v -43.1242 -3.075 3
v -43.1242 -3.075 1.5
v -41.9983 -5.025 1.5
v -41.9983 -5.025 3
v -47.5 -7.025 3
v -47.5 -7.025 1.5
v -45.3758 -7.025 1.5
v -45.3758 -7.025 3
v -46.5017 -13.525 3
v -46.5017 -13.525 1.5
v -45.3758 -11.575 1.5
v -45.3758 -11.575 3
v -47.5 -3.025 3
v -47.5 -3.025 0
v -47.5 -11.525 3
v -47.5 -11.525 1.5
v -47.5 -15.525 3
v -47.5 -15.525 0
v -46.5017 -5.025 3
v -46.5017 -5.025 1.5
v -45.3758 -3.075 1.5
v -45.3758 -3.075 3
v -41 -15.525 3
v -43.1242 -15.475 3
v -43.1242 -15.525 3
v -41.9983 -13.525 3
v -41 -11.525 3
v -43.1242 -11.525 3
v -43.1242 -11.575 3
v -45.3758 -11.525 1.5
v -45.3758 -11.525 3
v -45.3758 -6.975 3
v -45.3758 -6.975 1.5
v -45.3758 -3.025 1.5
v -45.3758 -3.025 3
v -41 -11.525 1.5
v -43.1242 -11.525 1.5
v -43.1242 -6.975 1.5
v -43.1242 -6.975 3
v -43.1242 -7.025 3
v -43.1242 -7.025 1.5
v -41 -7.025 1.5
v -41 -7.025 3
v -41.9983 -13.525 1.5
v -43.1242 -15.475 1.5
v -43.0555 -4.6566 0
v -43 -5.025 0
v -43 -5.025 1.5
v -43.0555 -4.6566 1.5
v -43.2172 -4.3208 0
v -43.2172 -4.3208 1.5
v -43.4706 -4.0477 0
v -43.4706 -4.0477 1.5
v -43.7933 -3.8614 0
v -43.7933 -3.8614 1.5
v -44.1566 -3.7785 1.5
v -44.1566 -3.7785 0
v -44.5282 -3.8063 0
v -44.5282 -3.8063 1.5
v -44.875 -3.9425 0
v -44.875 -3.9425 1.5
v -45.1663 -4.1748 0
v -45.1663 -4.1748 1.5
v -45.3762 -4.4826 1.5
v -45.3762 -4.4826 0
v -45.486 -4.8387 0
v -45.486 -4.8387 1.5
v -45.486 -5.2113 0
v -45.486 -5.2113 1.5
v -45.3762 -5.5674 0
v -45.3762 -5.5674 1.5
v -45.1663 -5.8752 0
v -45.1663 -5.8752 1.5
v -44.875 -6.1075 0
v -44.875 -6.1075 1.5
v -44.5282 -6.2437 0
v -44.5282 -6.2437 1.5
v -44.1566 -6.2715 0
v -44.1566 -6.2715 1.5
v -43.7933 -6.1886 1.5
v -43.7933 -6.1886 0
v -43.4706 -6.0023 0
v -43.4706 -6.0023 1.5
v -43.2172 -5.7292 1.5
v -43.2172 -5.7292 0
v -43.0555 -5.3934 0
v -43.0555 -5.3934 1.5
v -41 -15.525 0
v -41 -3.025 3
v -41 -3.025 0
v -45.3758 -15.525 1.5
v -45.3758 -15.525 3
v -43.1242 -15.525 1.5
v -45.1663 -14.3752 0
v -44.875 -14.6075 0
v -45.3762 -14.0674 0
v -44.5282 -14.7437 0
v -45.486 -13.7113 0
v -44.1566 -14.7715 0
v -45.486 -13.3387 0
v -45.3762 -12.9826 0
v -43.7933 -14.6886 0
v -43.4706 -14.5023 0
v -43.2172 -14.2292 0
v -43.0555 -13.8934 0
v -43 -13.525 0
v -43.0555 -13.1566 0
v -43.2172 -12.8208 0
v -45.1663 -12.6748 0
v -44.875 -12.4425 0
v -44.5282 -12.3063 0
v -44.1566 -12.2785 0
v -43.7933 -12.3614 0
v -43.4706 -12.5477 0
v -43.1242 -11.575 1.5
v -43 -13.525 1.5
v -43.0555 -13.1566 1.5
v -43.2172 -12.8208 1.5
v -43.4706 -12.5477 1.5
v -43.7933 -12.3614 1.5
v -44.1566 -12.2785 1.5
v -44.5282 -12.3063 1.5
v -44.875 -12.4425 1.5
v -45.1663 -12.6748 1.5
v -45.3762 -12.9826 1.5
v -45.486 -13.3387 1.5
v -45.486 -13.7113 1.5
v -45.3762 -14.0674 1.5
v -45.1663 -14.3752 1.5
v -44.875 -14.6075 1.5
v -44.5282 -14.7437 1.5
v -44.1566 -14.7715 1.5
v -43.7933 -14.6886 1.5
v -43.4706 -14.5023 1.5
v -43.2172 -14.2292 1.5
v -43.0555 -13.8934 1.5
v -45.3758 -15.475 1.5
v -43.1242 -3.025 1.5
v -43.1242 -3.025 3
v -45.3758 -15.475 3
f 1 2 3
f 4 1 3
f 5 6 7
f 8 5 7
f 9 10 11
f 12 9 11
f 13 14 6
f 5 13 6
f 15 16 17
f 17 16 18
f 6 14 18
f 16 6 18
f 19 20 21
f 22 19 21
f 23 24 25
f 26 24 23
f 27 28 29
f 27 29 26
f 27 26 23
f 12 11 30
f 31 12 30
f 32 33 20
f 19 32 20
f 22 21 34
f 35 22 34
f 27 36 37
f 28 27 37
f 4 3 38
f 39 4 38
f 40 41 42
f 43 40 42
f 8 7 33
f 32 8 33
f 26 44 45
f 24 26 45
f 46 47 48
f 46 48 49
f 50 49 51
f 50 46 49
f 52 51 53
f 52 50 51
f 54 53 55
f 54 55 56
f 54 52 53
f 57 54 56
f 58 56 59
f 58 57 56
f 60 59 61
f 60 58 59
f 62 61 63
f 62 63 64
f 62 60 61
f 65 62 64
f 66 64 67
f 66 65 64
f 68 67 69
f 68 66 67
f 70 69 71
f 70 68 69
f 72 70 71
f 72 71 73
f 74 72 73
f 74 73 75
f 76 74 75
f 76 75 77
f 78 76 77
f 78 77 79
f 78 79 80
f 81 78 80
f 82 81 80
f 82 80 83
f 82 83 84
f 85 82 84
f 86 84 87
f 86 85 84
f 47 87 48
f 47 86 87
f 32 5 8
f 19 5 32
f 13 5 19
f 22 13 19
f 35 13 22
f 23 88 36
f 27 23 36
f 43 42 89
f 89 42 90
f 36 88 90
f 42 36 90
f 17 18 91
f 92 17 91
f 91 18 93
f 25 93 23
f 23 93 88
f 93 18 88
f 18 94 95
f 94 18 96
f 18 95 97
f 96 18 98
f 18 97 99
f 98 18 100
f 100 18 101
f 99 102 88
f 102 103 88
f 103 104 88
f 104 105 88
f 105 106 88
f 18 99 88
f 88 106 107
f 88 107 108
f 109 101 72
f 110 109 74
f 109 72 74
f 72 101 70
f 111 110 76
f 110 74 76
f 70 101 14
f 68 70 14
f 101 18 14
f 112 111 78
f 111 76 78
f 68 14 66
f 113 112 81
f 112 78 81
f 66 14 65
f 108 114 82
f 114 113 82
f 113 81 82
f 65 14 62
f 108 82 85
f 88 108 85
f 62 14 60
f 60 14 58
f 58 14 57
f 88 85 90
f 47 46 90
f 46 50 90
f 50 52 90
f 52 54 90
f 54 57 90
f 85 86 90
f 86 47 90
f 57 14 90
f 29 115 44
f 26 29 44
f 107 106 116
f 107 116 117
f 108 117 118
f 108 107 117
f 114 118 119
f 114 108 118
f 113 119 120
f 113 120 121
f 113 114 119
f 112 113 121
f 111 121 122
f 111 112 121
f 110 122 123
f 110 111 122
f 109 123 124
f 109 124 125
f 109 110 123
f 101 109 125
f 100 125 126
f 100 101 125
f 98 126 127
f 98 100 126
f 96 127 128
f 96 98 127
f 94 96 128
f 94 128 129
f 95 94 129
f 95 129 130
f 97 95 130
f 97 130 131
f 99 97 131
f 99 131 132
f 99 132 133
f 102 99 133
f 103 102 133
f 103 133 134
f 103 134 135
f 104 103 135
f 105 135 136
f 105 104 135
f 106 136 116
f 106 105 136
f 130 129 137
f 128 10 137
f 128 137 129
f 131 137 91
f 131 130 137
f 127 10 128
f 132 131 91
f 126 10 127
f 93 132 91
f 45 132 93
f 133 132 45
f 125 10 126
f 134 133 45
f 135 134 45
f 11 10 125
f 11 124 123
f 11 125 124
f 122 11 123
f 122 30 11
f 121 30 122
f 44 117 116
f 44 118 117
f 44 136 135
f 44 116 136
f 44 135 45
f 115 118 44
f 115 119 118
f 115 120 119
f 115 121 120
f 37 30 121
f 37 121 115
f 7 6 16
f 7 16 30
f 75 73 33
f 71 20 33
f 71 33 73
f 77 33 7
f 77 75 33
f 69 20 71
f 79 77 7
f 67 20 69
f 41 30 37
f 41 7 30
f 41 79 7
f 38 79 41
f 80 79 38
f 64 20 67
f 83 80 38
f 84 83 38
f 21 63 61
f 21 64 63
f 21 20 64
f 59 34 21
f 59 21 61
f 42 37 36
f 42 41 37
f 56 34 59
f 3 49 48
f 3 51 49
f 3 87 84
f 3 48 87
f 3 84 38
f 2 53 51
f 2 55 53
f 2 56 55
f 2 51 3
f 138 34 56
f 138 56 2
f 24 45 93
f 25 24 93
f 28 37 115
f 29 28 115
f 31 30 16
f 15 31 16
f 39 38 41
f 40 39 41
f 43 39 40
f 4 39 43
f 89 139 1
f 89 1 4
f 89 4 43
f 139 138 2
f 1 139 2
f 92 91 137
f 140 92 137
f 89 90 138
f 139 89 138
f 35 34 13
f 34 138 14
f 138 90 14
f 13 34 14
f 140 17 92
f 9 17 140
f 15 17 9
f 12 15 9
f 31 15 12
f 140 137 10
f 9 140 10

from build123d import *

# Parameters (mm, degrees)
SKETCH1_W           = 6.5
SKETCH1_H           = 12.5
SKETCH1_R           = 1.25
BOSS_EXTRUDE1_DEPTH = 1.5
BOSS_EXTRUDE2_DEPTH = 1.5


with BuildPart() as part:
    # Sketch1 → Boss-Extrude1 (new body)
    with BuildSketch(Plane.XY):
        with Locations((-44.25, -9.275)):
            Rectangle(SKETCH1_W, SKETCH1_H)
        with Locations((-44.25, -5.025)):
            Circle(SKETCH1_R, mode=Mode.SUBTRACT)
        with Locations((-44.25, -13.525)):
            Circle(SKETCH1_R, mode=Mode.SUBTRACT)
    extrude(amount=BOSS_EXTRUDE1_DEPTH)

    # Sketch2 → Boss-Extrude2 (add)
    with BuildSketch(Plane.XY.offset(1.5)):
        Polygon((-45.375833025, -11.575), (-45.375833025, -11.525), (-47.5, -11.525), (-47.5, -15.525), (-45.375833025, -15.525), (-45.375833025, -15.475), (-46.50166605, -13.525), align=None)
        Polygon((-41, -11.525), (-43.124166975, -11.525), (-43.124166975, -11.575), (-41.99833395, -13.525), (-43.124166975, -15.475), (-43.124166975, -15.525), (-41, -15.525), align=None)
        Polygon((-47.5, -3.025), (-47.5, -7.025), (-45.375833025, -7.025), (-45.375833025, -6.975), (-46.50166605, -5.025), (-45.375833025, -3.075), (-45.375833025, -3.025), align=None)
        Polygon((-43.124166975, -7.025), (-41, -7.025), (-41, -3.025), (-43.124166975, -3.025), (-43.124166975, -3.075), (-41.99833395, -5.025), (-43.124166975, -6.975), align=None)
    extrude(amount=BOSS_EXTRUDE2_DEPTH)


solid = part.part
